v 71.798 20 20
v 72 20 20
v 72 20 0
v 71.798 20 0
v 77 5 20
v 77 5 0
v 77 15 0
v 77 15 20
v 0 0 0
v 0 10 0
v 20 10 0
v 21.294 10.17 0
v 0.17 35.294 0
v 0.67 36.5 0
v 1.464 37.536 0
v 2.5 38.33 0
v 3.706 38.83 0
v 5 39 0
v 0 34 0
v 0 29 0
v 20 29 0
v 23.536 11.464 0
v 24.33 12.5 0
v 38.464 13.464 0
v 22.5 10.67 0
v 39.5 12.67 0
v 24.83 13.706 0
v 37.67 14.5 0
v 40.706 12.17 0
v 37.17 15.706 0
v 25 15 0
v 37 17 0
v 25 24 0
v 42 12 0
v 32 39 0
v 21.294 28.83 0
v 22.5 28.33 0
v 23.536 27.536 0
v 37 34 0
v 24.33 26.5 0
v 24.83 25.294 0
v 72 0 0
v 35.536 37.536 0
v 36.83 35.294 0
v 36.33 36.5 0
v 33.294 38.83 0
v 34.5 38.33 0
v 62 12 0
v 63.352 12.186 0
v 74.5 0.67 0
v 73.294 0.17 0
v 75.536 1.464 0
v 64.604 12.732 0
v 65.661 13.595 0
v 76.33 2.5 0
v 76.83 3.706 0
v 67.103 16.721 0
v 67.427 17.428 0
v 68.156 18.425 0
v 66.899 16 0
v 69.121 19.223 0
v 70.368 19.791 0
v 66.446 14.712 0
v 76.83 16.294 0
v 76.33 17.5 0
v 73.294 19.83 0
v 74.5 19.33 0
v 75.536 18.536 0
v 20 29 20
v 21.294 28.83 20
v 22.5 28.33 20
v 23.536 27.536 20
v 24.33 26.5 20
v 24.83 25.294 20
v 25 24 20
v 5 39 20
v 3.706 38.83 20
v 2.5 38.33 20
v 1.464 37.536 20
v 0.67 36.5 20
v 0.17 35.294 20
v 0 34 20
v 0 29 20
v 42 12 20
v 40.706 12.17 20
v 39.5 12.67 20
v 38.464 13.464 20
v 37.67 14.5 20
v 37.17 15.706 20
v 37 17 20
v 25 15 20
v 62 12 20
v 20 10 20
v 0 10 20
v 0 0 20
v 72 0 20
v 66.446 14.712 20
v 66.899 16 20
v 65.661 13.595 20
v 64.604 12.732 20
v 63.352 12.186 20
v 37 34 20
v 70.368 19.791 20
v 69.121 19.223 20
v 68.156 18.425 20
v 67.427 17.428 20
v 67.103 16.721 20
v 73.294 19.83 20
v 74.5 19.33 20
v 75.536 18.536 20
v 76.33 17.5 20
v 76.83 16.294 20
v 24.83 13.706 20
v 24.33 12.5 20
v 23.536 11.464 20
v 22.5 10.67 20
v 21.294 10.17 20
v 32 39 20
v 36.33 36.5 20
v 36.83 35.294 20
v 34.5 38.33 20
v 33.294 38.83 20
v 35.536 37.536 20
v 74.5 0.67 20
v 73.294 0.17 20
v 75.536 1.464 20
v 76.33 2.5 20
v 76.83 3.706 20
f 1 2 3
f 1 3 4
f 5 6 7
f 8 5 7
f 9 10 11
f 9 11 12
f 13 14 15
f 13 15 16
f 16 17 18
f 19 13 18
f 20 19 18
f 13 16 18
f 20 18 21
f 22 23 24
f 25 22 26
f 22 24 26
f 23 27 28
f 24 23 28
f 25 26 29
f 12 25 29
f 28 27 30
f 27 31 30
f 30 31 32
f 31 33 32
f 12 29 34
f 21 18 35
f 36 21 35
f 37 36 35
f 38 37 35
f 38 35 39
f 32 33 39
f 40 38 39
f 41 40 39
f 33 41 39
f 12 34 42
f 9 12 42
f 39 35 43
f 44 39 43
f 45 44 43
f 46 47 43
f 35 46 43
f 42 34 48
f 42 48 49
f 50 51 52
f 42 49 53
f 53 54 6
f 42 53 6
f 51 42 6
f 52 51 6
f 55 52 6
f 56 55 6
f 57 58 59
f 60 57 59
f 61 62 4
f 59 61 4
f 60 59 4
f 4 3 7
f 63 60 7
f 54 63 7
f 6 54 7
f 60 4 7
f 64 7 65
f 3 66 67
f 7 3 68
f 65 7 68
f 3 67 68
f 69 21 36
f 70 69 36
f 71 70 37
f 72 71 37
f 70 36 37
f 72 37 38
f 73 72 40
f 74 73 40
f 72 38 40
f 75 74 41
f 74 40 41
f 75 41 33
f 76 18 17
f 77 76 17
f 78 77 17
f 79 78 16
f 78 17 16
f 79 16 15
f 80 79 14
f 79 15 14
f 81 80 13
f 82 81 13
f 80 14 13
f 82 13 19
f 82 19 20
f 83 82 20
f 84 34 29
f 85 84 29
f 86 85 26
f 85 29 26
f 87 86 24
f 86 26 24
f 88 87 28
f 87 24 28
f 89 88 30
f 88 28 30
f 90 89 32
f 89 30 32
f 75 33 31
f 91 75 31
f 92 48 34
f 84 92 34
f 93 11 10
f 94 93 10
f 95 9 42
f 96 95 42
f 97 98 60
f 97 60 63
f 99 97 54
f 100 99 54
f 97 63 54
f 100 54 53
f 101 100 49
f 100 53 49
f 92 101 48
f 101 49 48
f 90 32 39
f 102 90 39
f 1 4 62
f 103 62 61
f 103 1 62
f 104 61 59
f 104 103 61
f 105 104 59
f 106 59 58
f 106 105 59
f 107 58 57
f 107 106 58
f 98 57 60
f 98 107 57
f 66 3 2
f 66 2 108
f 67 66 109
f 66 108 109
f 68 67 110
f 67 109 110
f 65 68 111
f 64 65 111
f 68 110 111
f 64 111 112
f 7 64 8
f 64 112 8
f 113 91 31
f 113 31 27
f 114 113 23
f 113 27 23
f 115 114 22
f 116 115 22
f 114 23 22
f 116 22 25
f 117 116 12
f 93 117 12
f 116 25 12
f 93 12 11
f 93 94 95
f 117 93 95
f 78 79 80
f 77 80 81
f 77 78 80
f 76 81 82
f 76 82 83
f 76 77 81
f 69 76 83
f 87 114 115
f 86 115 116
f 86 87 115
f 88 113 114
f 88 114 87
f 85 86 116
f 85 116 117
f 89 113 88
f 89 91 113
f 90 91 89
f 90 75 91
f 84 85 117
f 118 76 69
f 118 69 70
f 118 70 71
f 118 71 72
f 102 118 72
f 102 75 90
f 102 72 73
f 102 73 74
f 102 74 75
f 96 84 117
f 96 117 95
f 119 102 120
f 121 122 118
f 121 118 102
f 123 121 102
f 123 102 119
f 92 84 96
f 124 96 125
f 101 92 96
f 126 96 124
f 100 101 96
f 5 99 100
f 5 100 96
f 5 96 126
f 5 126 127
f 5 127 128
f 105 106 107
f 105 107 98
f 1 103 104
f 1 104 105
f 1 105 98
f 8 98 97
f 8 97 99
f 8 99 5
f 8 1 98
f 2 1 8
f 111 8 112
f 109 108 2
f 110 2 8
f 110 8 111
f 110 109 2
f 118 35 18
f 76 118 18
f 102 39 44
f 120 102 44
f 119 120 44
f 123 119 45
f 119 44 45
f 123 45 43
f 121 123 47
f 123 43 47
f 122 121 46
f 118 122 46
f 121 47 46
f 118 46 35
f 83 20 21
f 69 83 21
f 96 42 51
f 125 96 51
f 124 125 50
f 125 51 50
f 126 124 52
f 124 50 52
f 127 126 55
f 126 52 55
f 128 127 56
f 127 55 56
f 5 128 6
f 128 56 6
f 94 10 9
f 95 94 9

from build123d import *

# Parameters (mm, degrees)
F1_DEPTH = 20
F2_R     = 5
F3_R     = 5
F4_ANGLE = 90


with BuildPart() as f1:
    # F0 (on Front) → F1 (new body)
    with BuildSketch(Plane.XZ):
        with BuildLine():
            Line((32, 39), (5, 39))
            ThreePointArc((5, 39), (1.4644660941, 37.5355339059), (0, 34))
            Line((0, 34), (0, 29))
            Line((0, 29), (20, 29))
            ThreePointArc((20, 29), (23.5355339059, 27.5355339059), (25, 24))
            Line((25, 24), (25, 15))
            ThreePointArc((25, 15), (23.5355339059, 11.4644660941), (20, 10))
            Line((20, 10), (0, 10))
            Line((0, 10), (0, 0))
            Line((0, 0), (72, 0))
            ThreePointArc((72, 0), (75.5355339059, 1.4644660941), (77, 5))
            Line((77, 5), (77, 20))
            Line((77, 20), (67, 20))
            Line((67, 20), (67, 17))
            ThreePointArc((67, 17), (65.5355339059, 13.4644660941), (62, 12))
            Line((62, 12), (42, 12))
            ThreePointArc((42, 12), (38.4644660941, 13.4644660941), (37, 17))
            Line((37, 17), (37, 34))
            ThreePointArc((37, 34), (35.5355339059, 37.5355339059), (32, 39))
        make_face()
    extrude(amount=F1_DEPTH)

    # F2
    f2_edges = [f1.edges().sort_by_distance(p)[0] for p in [
        (67, -10, 20),
    ]]
    fillet(f2_edges, radius=F2_R)

    # F3
    f3_edges = [f1.edges().sort_by_distance(p)[0] for p in [
        (77, -10, 20),
    ]]
    fillet(f3_edges, radius=F3_R)


with BuildPart() as f1_1:
    # F4: moved
    add(f1.part.rotate(Axis((36, 0, 0), (-1, 0, 0)), F4_ANGLE))


solid = f1_1.part
